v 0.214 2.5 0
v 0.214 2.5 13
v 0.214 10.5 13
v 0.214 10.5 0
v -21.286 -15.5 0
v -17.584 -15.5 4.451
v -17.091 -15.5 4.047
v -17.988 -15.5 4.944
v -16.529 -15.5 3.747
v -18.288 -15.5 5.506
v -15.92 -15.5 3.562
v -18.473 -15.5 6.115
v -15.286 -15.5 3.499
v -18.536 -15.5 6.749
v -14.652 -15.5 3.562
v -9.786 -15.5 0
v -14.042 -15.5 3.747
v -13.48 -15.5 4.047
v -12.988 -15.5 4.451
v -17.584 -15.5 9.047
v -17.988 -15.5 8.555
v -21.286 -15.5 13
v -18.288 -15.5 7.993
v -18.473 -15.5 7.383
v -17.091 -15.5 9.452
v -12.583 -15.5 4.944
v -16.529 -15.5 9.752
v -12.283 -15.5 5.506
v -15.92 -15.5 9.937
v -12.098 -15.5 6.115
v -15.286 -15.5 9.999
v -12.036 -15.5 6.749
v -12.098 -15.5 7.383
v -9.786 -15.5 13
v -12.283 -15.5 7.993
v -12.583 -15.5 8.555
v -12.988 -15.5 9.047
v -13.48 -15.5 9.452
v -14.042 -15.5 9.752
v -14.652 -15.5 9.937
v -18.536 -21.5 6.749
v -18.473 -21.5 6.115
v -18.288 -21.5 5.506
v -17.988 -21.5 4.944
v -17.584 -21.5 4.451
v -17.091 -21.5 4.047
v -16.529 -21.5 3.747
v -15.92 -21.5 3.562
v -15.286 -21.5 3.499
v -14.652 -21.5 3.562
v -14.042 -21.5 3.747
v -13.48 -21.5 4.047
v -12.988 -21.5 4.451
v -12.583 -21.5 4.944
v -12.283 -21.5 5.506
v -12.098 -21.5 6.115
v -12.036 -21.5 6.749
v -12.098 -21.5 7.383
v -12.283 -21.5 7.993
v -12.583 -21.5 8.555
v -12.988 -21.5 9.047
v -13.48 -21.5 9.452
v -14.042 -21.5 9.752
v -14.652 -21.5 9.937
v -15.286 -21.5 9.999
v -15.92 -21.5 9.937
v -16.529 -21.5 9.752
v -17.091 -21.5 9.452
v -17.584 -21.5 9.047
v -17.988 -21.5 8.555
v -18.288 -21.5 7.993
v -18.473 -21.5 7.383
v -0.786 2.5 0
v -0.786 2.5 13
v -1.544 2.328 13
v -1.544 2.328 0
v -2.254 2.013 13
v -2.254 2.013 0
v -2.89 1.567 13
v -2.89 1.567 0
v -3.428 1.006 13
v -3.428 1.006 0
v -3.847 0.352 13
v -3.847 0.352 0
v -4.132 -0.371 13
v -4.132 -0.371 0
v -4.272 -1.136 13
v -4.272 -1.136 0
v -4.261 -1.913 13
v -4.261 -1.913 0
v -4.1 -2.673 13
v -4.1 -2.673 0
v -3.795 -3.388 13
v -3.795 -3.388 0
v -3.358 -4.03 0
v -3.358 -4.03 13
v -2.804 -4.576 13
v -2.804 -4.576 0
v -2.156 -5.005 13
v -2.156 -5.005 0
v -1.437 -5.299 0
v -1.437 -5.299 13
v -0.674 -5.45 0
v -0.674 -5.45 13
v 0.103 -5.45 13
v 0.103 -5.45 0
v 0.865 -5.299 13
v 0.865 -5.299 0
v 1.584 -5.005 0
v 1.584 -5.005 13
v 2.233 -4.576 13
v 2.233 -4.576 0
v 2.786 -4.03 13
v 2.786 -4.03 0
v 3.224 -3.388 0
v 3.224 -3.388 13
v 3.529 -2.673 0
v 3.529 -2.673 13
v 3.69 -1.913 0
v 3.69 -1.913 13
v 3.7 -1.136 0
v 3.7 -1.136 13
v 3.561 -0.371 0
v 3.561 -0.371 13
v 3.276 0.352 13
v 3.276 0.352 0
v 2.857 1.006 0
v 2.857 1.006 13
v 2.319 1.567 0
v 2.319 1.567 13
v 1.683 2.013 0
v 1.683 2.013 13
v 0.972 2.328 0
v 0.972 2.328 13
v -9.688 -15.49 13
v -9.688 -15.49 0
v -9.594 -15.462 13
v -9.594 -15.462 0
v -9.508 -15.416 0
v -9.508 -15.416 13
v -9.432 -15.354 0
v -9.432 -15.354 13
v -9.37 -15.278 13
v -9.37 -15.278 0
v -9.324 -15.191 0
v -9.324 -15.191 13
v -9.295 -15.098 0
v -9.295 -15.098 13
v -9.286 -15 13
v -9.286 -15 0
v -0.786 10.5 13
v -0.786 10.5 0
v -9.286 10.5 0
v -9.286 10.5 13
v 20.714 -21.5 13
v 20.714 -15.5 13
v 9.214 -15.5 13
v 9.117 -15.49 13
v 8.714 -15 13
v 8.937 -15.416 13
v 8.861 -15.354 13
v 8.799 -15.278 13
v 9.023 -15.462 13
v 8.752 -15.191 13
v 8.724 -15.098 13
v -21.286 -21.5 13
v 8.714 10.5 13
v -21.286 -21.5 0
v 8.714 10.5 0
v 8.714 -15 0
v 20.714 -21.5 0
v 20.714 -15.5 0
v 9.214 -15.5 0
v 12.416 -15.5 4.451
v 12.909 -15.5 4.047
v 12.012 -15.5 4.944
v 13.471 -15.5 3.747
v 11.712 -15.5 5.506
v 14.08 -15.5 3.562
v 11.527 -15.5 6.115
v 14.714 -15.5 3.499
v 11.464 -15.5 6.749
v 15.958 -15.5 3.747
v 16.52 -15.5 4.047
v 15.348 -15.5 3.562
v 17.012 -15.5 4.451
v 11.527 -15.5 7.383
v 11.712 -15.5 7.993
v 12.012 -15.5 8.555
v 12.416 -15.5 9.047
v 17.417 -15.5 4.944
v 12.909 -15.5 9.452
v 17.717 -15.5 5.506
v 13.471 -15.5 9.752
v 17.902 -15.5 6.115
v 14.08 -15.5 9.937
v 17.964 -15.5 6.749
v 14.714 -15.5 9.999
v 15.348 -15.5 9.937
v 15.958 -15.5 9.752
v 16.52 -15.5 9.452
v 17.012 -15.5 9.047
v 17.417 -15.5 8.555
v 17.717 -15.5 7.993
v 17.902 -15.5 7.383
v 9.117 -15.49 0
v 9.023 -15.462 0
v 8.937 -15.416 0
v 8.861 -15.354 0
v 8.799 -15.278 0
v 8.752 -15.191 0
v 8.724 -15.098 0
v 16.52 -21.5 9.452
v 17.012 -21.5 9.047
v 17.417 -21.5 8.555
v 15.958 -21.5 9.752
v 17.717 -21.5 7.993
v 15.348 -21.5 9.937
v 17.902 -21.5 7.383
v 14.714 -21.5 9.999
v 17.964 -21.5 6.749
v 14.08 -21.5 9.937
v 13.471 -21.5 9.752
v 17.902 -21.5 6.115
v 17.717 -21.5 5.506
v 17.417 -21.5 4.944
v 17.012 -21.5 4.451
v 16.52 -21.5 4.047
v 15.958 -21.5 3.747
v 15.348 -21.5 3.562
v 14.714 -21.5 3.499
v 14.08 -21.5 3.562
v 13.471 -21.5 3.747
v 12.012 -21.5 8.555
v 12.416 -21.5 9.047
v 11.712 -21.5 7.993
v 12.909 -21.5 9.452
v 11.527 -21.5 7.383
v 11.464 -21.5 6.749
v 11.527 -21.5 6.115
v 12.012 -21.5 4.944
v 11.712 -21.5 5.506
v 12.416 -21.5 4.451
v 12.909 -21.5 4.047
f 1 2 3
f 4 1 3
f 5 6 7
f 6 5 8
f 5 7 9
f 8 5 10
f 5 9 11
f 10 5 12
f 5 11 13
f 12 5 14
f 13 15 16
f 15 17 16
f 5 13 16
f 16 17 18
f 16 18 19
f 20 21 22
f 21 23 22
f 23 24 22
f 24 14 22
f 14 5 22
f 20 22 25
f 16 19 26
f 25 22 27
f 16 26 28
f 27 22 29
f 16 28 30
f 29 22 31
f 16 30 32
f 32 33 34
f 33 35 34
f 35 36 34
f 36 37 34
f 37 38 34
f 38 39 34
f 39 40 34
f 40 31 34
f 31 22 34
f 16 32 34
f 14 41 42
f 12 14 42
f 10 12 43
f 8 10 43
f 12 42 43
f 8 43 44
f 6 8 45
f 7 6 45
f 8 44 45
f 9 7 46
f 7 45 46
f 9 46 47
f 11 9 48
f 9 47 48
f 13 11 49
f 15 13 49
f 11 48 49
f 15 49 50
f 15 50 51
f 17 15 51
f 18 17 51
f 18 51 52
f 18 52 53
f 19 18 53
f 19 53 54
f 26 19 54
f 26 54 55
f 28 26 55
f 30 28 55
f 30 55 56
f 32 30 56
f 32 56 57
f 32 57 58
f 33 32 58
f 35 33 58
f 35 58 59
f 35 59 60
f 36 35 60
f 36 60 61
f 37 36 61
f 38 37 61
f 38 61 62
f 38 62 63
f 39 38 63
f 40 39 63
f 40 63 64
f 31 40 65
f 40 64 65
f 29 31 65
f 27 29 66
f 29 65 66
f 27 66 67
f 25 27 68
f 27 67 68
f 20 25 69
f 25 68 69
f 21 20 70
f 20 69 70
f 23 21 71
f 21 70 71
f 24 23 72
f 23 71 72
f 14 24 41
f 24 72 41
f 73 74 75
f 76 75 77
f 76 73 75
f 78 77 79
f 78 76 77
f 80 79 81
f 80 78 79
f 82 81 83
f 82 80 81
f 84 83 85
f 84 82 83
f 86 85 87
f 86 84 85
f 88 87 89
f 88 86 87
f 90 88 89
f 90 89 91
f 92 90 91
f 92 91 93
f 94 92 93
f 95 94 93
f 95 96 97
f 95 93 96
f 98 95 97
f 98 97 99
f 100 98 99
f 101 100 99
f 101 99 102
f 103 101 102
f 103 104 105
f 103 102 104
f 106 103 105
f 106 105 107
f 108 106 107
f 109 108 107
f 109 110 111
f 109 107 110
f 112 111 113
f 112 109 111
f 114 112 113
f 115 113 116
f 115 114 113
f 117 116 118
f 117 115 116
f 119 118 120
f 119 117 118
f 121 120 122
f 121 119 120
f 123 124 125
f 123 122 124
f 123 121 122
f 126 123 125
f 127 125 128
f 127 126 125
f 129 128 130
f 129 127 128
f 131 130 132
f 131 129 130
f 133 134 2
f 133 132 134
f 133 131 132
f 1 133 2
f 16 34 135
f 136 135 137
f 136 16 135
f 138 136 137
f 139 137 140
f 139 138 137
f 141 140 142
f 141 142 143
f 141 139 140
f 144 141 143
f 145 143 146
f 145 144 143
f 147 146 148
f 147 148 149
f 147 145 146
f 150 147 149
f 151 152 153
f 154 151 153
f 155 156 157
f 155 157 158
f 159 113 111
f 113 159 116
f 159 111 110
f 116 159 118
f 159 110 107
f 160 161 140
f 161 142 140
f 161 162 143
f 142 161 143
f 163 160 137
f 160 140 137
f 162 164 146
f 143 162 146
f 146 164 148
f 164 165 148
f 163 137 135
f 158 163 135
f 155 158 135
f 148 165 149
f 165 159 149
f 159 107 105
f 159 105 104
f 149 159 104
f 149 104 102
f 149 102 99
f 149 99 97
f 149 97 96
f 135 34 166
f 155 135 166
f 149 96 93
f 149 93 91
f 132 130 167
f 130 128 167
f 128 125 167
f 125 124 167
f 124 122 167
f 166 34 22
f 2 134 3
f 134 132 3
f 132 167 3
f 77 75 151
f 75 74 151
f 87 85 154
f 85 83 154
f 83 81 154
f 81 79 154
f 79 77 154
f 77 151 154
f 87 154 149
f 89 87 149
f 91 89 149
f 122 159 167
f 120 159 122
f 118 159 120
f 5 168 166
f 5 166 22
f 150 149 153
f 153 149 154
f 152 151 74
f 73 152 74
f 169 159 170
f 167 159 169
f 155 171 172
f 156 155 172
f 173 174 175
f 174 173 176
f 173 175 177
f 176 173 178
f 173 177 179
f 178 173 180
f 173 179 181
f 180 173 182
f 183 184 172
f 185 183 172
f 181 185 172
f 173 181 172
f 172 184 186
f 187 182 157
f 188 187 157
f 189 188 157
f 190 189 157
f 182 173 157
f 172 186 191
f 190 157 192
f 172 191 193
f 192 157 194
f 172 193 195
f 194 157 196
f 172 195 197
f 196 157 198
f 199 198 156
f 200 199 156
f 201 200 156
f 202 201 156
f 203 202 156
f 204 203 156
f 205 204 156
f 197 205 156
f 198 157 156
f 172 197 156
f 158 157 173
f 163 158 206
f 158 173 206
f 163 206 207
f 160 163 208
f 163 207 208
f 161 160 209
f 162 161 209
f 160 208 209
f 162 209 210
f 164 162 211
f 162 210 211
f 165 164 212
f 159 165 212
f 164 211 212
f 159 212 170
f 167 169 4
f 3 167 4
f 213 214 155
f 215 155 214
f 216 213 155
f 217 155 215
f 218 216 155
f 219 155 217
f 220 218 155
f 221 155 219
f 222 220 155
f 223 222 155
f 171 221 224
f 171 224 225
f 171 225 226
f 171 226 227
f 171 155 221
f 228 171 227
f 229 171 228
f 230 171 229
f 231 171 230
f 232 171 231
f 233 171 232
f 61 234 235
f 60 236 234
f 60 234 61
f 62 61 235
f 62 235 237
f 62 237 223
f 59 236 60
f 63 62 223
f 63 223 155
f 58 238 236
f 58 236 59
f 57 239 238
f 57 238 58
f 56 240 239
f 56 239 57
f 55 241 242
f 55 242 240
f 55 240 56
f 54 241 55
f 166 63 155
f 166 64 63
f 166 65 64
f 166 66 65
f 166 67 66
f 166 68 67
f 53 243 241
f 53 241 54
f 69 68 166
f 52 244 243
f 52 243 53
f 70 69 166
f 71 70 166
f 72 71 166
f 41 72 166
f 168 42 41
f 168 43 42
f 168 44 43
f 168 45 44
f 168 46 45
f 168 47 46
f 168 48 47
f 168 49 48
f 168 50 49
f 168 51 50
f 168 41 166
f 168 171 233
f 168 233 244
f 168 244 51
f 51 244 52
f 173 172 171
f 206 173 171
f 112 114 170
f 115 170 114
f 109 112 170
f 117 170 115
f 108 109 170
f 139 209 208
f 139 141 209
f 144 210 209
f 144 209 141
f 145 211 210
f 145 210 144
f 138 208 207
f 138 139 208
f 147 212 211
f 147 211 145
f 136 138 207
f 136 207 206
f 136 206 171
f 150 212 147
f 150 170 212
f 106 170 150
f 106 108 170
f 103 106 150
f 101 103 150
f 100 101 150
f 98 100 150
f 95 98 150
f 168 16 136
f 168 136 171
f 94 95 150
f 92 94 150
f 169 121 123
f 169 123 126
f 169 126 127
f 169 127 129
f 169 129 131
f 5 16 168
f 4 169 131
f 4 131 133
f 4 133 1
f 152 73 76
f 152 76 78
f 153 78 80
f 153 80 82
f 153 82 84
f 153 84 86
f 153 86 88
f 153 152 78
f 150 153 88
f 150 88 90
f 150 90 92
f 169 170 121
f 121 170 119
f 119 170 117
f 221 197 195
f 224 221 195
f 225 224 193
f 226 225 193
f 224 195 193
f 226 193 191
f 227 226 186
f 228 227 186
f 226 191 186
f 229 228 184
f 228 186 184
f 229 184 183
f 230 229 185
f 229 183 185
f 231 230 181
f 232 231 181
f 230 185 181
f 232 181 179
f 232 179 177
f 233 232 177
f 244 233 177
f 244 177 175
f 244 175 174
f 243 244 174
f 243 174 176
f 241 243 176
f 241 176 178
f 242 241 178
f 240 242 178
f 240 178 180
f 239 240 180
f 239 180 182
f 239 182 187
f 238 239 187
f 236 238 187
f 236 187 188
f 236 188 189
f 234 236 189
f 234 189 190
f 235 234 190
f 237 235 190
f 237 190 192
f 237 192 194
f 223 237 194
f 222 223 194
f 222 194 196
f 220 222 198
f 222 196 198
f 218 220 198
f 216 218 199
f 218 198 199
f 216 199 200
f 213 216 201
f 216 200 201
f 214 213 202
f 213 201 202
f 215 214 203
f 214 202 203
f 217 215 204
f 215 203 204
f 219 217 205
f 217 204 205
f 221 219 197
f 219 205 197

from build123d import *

# Parameters (mm, degrees)
SKETCH1_W                      = 42
SKETCH1_H                      = 32
BOSS_EXTRUDE1_DEPTH            = 13
SKETCH2_W                      = 12
SKETCH2_H                      = 26
CUT_EXTRUDE1_DEPTH             = 33.929191193
SKETCH3_W                      = 12
SKETCH3_H                      = 26
CUT_EXTRUDE2_DEPTH             = 33.929191193
CUT_EXTRUDE3_DEPTH             = 33.929191193
SKETCH5_W                      = 4
SKETCH5_H                      = 13
F_6_5_6_5_DIAMETER_HOLE1_D     = 6.5
F_6_5_6_5_DIAMETER_HOLE1_DEPTH = 32
F_6_5_6_5_DIAMETER_HOLE2_D     = 6.5
FILLET1_R                      = 0.5


with BuildPart() as part:
    # Sketch1 → Boss-Extrude1 (new body)
    with BuildSketch(Plane(origin=(0, 0, 0), x_dir=(-1, 0, 0), z_dir=(0, 0, -1))):
        with Locations((0.285714286, -5.5)):
            Rectangle(SKETCH1_W, SKETCH1_H)
    extrude(amount=-BOSS_EXTRUDE1_DEPTH)

    # Sketch2 → Cut-Extrude1 (cut, through all)
    with BuildSketch(Plane.XY.offset(13)):
        with Locations((14.714285714, -2.5)):
            Rectangle(SKETCH2_W, SKETCH2_H)
    extrude(amount=-CUT_EXTRUDE1_DEPTH, mode=Mode.SUBTRACT)

    # Sketch3 → Cut-Extrude2 (cut, through all)
    with BuildSketch(Plane.XY.offset(13)):
        with Locations((-15.285714286, -2.5)):
            Rectangle(SKETCH3_W, SKETCH3_H)
    extrude(amount=-CUT_EXTRUDE2_DEPTH, mode=Mode.SUBTRACT)

    # Sketch4 → Cut-Extrude3 (cut, through all)
    with BuildSketch(Plane.XY.offset(13)):
        with BuildLine():
            Line((0.214285714, 10.5), (-0.785714286, 10.5))
            Line((-0.785714286, 10.5), (-0.785714286, 2.5))
            ThreePointArc((-0.785714286, 2.5), (-0.285714286, 2.531373033), (0.214285714, 2.5))
            Line((0.214285714, 2.5), (0.214285714, 10.5))
        make_face()
    extrude(amount=-CUT_EXTRUDE3_DEPTH, mode=Mode.SUBTRACT)

    # Sketch5 → Cut-Revolve1 (revolve, cut)
    with BuildSketch(Plane(origin=(0, -1.468626967, 0), x_dir=(1, 0, 0), z_dir=(0, 1, 0))):
        with Locations((1.714285714, -6.5)):
            Rectangle(SKETCH5_W, SKETCH5_H)
    revolve(axis=Axis((-0.285714286, -1.468626967, 0), (0, 0, 1)), mode=Mode.SUBTRACT)

    # Ø6.5 (6.5) Diameter Hole1
    with Locations(Plane(origin=(0, -21.5, 0), x_dir=(-1, 0, 0), z_dir=(0, -1, 0))):
        with Locations((-14.714285714, -6.749358536)):
            Hole(F_6_5_6_5_DIAMETER_HOLE1_D / 2, depth=F_6_5_6_5_DIAMETER_HOLE1_DEPTH)

    # Ø6.5 (6.5) Diameter Hole2 (through all)
    with Locations(Plane(origin=(0, -15.5, 0), x_dir=(1, 0, 0), z_dir=(0, 1, 0))):
        with Locations((-15.285714286, -6.749358536)):
            Hole(F_6_5_6_5_DIAMETER_HOLE2_D / 2)

    # Fillet1
    fillet1_edges = [part.edges().sort_by_distance(p)[0] for p in [
        (8.714285714, -15.5, 6.5),
        (-9.285714286, -15.5, 6.5),
    ]]
    fillet(fillet1_edges, radius=FILLET1_R)


solid = part.part
